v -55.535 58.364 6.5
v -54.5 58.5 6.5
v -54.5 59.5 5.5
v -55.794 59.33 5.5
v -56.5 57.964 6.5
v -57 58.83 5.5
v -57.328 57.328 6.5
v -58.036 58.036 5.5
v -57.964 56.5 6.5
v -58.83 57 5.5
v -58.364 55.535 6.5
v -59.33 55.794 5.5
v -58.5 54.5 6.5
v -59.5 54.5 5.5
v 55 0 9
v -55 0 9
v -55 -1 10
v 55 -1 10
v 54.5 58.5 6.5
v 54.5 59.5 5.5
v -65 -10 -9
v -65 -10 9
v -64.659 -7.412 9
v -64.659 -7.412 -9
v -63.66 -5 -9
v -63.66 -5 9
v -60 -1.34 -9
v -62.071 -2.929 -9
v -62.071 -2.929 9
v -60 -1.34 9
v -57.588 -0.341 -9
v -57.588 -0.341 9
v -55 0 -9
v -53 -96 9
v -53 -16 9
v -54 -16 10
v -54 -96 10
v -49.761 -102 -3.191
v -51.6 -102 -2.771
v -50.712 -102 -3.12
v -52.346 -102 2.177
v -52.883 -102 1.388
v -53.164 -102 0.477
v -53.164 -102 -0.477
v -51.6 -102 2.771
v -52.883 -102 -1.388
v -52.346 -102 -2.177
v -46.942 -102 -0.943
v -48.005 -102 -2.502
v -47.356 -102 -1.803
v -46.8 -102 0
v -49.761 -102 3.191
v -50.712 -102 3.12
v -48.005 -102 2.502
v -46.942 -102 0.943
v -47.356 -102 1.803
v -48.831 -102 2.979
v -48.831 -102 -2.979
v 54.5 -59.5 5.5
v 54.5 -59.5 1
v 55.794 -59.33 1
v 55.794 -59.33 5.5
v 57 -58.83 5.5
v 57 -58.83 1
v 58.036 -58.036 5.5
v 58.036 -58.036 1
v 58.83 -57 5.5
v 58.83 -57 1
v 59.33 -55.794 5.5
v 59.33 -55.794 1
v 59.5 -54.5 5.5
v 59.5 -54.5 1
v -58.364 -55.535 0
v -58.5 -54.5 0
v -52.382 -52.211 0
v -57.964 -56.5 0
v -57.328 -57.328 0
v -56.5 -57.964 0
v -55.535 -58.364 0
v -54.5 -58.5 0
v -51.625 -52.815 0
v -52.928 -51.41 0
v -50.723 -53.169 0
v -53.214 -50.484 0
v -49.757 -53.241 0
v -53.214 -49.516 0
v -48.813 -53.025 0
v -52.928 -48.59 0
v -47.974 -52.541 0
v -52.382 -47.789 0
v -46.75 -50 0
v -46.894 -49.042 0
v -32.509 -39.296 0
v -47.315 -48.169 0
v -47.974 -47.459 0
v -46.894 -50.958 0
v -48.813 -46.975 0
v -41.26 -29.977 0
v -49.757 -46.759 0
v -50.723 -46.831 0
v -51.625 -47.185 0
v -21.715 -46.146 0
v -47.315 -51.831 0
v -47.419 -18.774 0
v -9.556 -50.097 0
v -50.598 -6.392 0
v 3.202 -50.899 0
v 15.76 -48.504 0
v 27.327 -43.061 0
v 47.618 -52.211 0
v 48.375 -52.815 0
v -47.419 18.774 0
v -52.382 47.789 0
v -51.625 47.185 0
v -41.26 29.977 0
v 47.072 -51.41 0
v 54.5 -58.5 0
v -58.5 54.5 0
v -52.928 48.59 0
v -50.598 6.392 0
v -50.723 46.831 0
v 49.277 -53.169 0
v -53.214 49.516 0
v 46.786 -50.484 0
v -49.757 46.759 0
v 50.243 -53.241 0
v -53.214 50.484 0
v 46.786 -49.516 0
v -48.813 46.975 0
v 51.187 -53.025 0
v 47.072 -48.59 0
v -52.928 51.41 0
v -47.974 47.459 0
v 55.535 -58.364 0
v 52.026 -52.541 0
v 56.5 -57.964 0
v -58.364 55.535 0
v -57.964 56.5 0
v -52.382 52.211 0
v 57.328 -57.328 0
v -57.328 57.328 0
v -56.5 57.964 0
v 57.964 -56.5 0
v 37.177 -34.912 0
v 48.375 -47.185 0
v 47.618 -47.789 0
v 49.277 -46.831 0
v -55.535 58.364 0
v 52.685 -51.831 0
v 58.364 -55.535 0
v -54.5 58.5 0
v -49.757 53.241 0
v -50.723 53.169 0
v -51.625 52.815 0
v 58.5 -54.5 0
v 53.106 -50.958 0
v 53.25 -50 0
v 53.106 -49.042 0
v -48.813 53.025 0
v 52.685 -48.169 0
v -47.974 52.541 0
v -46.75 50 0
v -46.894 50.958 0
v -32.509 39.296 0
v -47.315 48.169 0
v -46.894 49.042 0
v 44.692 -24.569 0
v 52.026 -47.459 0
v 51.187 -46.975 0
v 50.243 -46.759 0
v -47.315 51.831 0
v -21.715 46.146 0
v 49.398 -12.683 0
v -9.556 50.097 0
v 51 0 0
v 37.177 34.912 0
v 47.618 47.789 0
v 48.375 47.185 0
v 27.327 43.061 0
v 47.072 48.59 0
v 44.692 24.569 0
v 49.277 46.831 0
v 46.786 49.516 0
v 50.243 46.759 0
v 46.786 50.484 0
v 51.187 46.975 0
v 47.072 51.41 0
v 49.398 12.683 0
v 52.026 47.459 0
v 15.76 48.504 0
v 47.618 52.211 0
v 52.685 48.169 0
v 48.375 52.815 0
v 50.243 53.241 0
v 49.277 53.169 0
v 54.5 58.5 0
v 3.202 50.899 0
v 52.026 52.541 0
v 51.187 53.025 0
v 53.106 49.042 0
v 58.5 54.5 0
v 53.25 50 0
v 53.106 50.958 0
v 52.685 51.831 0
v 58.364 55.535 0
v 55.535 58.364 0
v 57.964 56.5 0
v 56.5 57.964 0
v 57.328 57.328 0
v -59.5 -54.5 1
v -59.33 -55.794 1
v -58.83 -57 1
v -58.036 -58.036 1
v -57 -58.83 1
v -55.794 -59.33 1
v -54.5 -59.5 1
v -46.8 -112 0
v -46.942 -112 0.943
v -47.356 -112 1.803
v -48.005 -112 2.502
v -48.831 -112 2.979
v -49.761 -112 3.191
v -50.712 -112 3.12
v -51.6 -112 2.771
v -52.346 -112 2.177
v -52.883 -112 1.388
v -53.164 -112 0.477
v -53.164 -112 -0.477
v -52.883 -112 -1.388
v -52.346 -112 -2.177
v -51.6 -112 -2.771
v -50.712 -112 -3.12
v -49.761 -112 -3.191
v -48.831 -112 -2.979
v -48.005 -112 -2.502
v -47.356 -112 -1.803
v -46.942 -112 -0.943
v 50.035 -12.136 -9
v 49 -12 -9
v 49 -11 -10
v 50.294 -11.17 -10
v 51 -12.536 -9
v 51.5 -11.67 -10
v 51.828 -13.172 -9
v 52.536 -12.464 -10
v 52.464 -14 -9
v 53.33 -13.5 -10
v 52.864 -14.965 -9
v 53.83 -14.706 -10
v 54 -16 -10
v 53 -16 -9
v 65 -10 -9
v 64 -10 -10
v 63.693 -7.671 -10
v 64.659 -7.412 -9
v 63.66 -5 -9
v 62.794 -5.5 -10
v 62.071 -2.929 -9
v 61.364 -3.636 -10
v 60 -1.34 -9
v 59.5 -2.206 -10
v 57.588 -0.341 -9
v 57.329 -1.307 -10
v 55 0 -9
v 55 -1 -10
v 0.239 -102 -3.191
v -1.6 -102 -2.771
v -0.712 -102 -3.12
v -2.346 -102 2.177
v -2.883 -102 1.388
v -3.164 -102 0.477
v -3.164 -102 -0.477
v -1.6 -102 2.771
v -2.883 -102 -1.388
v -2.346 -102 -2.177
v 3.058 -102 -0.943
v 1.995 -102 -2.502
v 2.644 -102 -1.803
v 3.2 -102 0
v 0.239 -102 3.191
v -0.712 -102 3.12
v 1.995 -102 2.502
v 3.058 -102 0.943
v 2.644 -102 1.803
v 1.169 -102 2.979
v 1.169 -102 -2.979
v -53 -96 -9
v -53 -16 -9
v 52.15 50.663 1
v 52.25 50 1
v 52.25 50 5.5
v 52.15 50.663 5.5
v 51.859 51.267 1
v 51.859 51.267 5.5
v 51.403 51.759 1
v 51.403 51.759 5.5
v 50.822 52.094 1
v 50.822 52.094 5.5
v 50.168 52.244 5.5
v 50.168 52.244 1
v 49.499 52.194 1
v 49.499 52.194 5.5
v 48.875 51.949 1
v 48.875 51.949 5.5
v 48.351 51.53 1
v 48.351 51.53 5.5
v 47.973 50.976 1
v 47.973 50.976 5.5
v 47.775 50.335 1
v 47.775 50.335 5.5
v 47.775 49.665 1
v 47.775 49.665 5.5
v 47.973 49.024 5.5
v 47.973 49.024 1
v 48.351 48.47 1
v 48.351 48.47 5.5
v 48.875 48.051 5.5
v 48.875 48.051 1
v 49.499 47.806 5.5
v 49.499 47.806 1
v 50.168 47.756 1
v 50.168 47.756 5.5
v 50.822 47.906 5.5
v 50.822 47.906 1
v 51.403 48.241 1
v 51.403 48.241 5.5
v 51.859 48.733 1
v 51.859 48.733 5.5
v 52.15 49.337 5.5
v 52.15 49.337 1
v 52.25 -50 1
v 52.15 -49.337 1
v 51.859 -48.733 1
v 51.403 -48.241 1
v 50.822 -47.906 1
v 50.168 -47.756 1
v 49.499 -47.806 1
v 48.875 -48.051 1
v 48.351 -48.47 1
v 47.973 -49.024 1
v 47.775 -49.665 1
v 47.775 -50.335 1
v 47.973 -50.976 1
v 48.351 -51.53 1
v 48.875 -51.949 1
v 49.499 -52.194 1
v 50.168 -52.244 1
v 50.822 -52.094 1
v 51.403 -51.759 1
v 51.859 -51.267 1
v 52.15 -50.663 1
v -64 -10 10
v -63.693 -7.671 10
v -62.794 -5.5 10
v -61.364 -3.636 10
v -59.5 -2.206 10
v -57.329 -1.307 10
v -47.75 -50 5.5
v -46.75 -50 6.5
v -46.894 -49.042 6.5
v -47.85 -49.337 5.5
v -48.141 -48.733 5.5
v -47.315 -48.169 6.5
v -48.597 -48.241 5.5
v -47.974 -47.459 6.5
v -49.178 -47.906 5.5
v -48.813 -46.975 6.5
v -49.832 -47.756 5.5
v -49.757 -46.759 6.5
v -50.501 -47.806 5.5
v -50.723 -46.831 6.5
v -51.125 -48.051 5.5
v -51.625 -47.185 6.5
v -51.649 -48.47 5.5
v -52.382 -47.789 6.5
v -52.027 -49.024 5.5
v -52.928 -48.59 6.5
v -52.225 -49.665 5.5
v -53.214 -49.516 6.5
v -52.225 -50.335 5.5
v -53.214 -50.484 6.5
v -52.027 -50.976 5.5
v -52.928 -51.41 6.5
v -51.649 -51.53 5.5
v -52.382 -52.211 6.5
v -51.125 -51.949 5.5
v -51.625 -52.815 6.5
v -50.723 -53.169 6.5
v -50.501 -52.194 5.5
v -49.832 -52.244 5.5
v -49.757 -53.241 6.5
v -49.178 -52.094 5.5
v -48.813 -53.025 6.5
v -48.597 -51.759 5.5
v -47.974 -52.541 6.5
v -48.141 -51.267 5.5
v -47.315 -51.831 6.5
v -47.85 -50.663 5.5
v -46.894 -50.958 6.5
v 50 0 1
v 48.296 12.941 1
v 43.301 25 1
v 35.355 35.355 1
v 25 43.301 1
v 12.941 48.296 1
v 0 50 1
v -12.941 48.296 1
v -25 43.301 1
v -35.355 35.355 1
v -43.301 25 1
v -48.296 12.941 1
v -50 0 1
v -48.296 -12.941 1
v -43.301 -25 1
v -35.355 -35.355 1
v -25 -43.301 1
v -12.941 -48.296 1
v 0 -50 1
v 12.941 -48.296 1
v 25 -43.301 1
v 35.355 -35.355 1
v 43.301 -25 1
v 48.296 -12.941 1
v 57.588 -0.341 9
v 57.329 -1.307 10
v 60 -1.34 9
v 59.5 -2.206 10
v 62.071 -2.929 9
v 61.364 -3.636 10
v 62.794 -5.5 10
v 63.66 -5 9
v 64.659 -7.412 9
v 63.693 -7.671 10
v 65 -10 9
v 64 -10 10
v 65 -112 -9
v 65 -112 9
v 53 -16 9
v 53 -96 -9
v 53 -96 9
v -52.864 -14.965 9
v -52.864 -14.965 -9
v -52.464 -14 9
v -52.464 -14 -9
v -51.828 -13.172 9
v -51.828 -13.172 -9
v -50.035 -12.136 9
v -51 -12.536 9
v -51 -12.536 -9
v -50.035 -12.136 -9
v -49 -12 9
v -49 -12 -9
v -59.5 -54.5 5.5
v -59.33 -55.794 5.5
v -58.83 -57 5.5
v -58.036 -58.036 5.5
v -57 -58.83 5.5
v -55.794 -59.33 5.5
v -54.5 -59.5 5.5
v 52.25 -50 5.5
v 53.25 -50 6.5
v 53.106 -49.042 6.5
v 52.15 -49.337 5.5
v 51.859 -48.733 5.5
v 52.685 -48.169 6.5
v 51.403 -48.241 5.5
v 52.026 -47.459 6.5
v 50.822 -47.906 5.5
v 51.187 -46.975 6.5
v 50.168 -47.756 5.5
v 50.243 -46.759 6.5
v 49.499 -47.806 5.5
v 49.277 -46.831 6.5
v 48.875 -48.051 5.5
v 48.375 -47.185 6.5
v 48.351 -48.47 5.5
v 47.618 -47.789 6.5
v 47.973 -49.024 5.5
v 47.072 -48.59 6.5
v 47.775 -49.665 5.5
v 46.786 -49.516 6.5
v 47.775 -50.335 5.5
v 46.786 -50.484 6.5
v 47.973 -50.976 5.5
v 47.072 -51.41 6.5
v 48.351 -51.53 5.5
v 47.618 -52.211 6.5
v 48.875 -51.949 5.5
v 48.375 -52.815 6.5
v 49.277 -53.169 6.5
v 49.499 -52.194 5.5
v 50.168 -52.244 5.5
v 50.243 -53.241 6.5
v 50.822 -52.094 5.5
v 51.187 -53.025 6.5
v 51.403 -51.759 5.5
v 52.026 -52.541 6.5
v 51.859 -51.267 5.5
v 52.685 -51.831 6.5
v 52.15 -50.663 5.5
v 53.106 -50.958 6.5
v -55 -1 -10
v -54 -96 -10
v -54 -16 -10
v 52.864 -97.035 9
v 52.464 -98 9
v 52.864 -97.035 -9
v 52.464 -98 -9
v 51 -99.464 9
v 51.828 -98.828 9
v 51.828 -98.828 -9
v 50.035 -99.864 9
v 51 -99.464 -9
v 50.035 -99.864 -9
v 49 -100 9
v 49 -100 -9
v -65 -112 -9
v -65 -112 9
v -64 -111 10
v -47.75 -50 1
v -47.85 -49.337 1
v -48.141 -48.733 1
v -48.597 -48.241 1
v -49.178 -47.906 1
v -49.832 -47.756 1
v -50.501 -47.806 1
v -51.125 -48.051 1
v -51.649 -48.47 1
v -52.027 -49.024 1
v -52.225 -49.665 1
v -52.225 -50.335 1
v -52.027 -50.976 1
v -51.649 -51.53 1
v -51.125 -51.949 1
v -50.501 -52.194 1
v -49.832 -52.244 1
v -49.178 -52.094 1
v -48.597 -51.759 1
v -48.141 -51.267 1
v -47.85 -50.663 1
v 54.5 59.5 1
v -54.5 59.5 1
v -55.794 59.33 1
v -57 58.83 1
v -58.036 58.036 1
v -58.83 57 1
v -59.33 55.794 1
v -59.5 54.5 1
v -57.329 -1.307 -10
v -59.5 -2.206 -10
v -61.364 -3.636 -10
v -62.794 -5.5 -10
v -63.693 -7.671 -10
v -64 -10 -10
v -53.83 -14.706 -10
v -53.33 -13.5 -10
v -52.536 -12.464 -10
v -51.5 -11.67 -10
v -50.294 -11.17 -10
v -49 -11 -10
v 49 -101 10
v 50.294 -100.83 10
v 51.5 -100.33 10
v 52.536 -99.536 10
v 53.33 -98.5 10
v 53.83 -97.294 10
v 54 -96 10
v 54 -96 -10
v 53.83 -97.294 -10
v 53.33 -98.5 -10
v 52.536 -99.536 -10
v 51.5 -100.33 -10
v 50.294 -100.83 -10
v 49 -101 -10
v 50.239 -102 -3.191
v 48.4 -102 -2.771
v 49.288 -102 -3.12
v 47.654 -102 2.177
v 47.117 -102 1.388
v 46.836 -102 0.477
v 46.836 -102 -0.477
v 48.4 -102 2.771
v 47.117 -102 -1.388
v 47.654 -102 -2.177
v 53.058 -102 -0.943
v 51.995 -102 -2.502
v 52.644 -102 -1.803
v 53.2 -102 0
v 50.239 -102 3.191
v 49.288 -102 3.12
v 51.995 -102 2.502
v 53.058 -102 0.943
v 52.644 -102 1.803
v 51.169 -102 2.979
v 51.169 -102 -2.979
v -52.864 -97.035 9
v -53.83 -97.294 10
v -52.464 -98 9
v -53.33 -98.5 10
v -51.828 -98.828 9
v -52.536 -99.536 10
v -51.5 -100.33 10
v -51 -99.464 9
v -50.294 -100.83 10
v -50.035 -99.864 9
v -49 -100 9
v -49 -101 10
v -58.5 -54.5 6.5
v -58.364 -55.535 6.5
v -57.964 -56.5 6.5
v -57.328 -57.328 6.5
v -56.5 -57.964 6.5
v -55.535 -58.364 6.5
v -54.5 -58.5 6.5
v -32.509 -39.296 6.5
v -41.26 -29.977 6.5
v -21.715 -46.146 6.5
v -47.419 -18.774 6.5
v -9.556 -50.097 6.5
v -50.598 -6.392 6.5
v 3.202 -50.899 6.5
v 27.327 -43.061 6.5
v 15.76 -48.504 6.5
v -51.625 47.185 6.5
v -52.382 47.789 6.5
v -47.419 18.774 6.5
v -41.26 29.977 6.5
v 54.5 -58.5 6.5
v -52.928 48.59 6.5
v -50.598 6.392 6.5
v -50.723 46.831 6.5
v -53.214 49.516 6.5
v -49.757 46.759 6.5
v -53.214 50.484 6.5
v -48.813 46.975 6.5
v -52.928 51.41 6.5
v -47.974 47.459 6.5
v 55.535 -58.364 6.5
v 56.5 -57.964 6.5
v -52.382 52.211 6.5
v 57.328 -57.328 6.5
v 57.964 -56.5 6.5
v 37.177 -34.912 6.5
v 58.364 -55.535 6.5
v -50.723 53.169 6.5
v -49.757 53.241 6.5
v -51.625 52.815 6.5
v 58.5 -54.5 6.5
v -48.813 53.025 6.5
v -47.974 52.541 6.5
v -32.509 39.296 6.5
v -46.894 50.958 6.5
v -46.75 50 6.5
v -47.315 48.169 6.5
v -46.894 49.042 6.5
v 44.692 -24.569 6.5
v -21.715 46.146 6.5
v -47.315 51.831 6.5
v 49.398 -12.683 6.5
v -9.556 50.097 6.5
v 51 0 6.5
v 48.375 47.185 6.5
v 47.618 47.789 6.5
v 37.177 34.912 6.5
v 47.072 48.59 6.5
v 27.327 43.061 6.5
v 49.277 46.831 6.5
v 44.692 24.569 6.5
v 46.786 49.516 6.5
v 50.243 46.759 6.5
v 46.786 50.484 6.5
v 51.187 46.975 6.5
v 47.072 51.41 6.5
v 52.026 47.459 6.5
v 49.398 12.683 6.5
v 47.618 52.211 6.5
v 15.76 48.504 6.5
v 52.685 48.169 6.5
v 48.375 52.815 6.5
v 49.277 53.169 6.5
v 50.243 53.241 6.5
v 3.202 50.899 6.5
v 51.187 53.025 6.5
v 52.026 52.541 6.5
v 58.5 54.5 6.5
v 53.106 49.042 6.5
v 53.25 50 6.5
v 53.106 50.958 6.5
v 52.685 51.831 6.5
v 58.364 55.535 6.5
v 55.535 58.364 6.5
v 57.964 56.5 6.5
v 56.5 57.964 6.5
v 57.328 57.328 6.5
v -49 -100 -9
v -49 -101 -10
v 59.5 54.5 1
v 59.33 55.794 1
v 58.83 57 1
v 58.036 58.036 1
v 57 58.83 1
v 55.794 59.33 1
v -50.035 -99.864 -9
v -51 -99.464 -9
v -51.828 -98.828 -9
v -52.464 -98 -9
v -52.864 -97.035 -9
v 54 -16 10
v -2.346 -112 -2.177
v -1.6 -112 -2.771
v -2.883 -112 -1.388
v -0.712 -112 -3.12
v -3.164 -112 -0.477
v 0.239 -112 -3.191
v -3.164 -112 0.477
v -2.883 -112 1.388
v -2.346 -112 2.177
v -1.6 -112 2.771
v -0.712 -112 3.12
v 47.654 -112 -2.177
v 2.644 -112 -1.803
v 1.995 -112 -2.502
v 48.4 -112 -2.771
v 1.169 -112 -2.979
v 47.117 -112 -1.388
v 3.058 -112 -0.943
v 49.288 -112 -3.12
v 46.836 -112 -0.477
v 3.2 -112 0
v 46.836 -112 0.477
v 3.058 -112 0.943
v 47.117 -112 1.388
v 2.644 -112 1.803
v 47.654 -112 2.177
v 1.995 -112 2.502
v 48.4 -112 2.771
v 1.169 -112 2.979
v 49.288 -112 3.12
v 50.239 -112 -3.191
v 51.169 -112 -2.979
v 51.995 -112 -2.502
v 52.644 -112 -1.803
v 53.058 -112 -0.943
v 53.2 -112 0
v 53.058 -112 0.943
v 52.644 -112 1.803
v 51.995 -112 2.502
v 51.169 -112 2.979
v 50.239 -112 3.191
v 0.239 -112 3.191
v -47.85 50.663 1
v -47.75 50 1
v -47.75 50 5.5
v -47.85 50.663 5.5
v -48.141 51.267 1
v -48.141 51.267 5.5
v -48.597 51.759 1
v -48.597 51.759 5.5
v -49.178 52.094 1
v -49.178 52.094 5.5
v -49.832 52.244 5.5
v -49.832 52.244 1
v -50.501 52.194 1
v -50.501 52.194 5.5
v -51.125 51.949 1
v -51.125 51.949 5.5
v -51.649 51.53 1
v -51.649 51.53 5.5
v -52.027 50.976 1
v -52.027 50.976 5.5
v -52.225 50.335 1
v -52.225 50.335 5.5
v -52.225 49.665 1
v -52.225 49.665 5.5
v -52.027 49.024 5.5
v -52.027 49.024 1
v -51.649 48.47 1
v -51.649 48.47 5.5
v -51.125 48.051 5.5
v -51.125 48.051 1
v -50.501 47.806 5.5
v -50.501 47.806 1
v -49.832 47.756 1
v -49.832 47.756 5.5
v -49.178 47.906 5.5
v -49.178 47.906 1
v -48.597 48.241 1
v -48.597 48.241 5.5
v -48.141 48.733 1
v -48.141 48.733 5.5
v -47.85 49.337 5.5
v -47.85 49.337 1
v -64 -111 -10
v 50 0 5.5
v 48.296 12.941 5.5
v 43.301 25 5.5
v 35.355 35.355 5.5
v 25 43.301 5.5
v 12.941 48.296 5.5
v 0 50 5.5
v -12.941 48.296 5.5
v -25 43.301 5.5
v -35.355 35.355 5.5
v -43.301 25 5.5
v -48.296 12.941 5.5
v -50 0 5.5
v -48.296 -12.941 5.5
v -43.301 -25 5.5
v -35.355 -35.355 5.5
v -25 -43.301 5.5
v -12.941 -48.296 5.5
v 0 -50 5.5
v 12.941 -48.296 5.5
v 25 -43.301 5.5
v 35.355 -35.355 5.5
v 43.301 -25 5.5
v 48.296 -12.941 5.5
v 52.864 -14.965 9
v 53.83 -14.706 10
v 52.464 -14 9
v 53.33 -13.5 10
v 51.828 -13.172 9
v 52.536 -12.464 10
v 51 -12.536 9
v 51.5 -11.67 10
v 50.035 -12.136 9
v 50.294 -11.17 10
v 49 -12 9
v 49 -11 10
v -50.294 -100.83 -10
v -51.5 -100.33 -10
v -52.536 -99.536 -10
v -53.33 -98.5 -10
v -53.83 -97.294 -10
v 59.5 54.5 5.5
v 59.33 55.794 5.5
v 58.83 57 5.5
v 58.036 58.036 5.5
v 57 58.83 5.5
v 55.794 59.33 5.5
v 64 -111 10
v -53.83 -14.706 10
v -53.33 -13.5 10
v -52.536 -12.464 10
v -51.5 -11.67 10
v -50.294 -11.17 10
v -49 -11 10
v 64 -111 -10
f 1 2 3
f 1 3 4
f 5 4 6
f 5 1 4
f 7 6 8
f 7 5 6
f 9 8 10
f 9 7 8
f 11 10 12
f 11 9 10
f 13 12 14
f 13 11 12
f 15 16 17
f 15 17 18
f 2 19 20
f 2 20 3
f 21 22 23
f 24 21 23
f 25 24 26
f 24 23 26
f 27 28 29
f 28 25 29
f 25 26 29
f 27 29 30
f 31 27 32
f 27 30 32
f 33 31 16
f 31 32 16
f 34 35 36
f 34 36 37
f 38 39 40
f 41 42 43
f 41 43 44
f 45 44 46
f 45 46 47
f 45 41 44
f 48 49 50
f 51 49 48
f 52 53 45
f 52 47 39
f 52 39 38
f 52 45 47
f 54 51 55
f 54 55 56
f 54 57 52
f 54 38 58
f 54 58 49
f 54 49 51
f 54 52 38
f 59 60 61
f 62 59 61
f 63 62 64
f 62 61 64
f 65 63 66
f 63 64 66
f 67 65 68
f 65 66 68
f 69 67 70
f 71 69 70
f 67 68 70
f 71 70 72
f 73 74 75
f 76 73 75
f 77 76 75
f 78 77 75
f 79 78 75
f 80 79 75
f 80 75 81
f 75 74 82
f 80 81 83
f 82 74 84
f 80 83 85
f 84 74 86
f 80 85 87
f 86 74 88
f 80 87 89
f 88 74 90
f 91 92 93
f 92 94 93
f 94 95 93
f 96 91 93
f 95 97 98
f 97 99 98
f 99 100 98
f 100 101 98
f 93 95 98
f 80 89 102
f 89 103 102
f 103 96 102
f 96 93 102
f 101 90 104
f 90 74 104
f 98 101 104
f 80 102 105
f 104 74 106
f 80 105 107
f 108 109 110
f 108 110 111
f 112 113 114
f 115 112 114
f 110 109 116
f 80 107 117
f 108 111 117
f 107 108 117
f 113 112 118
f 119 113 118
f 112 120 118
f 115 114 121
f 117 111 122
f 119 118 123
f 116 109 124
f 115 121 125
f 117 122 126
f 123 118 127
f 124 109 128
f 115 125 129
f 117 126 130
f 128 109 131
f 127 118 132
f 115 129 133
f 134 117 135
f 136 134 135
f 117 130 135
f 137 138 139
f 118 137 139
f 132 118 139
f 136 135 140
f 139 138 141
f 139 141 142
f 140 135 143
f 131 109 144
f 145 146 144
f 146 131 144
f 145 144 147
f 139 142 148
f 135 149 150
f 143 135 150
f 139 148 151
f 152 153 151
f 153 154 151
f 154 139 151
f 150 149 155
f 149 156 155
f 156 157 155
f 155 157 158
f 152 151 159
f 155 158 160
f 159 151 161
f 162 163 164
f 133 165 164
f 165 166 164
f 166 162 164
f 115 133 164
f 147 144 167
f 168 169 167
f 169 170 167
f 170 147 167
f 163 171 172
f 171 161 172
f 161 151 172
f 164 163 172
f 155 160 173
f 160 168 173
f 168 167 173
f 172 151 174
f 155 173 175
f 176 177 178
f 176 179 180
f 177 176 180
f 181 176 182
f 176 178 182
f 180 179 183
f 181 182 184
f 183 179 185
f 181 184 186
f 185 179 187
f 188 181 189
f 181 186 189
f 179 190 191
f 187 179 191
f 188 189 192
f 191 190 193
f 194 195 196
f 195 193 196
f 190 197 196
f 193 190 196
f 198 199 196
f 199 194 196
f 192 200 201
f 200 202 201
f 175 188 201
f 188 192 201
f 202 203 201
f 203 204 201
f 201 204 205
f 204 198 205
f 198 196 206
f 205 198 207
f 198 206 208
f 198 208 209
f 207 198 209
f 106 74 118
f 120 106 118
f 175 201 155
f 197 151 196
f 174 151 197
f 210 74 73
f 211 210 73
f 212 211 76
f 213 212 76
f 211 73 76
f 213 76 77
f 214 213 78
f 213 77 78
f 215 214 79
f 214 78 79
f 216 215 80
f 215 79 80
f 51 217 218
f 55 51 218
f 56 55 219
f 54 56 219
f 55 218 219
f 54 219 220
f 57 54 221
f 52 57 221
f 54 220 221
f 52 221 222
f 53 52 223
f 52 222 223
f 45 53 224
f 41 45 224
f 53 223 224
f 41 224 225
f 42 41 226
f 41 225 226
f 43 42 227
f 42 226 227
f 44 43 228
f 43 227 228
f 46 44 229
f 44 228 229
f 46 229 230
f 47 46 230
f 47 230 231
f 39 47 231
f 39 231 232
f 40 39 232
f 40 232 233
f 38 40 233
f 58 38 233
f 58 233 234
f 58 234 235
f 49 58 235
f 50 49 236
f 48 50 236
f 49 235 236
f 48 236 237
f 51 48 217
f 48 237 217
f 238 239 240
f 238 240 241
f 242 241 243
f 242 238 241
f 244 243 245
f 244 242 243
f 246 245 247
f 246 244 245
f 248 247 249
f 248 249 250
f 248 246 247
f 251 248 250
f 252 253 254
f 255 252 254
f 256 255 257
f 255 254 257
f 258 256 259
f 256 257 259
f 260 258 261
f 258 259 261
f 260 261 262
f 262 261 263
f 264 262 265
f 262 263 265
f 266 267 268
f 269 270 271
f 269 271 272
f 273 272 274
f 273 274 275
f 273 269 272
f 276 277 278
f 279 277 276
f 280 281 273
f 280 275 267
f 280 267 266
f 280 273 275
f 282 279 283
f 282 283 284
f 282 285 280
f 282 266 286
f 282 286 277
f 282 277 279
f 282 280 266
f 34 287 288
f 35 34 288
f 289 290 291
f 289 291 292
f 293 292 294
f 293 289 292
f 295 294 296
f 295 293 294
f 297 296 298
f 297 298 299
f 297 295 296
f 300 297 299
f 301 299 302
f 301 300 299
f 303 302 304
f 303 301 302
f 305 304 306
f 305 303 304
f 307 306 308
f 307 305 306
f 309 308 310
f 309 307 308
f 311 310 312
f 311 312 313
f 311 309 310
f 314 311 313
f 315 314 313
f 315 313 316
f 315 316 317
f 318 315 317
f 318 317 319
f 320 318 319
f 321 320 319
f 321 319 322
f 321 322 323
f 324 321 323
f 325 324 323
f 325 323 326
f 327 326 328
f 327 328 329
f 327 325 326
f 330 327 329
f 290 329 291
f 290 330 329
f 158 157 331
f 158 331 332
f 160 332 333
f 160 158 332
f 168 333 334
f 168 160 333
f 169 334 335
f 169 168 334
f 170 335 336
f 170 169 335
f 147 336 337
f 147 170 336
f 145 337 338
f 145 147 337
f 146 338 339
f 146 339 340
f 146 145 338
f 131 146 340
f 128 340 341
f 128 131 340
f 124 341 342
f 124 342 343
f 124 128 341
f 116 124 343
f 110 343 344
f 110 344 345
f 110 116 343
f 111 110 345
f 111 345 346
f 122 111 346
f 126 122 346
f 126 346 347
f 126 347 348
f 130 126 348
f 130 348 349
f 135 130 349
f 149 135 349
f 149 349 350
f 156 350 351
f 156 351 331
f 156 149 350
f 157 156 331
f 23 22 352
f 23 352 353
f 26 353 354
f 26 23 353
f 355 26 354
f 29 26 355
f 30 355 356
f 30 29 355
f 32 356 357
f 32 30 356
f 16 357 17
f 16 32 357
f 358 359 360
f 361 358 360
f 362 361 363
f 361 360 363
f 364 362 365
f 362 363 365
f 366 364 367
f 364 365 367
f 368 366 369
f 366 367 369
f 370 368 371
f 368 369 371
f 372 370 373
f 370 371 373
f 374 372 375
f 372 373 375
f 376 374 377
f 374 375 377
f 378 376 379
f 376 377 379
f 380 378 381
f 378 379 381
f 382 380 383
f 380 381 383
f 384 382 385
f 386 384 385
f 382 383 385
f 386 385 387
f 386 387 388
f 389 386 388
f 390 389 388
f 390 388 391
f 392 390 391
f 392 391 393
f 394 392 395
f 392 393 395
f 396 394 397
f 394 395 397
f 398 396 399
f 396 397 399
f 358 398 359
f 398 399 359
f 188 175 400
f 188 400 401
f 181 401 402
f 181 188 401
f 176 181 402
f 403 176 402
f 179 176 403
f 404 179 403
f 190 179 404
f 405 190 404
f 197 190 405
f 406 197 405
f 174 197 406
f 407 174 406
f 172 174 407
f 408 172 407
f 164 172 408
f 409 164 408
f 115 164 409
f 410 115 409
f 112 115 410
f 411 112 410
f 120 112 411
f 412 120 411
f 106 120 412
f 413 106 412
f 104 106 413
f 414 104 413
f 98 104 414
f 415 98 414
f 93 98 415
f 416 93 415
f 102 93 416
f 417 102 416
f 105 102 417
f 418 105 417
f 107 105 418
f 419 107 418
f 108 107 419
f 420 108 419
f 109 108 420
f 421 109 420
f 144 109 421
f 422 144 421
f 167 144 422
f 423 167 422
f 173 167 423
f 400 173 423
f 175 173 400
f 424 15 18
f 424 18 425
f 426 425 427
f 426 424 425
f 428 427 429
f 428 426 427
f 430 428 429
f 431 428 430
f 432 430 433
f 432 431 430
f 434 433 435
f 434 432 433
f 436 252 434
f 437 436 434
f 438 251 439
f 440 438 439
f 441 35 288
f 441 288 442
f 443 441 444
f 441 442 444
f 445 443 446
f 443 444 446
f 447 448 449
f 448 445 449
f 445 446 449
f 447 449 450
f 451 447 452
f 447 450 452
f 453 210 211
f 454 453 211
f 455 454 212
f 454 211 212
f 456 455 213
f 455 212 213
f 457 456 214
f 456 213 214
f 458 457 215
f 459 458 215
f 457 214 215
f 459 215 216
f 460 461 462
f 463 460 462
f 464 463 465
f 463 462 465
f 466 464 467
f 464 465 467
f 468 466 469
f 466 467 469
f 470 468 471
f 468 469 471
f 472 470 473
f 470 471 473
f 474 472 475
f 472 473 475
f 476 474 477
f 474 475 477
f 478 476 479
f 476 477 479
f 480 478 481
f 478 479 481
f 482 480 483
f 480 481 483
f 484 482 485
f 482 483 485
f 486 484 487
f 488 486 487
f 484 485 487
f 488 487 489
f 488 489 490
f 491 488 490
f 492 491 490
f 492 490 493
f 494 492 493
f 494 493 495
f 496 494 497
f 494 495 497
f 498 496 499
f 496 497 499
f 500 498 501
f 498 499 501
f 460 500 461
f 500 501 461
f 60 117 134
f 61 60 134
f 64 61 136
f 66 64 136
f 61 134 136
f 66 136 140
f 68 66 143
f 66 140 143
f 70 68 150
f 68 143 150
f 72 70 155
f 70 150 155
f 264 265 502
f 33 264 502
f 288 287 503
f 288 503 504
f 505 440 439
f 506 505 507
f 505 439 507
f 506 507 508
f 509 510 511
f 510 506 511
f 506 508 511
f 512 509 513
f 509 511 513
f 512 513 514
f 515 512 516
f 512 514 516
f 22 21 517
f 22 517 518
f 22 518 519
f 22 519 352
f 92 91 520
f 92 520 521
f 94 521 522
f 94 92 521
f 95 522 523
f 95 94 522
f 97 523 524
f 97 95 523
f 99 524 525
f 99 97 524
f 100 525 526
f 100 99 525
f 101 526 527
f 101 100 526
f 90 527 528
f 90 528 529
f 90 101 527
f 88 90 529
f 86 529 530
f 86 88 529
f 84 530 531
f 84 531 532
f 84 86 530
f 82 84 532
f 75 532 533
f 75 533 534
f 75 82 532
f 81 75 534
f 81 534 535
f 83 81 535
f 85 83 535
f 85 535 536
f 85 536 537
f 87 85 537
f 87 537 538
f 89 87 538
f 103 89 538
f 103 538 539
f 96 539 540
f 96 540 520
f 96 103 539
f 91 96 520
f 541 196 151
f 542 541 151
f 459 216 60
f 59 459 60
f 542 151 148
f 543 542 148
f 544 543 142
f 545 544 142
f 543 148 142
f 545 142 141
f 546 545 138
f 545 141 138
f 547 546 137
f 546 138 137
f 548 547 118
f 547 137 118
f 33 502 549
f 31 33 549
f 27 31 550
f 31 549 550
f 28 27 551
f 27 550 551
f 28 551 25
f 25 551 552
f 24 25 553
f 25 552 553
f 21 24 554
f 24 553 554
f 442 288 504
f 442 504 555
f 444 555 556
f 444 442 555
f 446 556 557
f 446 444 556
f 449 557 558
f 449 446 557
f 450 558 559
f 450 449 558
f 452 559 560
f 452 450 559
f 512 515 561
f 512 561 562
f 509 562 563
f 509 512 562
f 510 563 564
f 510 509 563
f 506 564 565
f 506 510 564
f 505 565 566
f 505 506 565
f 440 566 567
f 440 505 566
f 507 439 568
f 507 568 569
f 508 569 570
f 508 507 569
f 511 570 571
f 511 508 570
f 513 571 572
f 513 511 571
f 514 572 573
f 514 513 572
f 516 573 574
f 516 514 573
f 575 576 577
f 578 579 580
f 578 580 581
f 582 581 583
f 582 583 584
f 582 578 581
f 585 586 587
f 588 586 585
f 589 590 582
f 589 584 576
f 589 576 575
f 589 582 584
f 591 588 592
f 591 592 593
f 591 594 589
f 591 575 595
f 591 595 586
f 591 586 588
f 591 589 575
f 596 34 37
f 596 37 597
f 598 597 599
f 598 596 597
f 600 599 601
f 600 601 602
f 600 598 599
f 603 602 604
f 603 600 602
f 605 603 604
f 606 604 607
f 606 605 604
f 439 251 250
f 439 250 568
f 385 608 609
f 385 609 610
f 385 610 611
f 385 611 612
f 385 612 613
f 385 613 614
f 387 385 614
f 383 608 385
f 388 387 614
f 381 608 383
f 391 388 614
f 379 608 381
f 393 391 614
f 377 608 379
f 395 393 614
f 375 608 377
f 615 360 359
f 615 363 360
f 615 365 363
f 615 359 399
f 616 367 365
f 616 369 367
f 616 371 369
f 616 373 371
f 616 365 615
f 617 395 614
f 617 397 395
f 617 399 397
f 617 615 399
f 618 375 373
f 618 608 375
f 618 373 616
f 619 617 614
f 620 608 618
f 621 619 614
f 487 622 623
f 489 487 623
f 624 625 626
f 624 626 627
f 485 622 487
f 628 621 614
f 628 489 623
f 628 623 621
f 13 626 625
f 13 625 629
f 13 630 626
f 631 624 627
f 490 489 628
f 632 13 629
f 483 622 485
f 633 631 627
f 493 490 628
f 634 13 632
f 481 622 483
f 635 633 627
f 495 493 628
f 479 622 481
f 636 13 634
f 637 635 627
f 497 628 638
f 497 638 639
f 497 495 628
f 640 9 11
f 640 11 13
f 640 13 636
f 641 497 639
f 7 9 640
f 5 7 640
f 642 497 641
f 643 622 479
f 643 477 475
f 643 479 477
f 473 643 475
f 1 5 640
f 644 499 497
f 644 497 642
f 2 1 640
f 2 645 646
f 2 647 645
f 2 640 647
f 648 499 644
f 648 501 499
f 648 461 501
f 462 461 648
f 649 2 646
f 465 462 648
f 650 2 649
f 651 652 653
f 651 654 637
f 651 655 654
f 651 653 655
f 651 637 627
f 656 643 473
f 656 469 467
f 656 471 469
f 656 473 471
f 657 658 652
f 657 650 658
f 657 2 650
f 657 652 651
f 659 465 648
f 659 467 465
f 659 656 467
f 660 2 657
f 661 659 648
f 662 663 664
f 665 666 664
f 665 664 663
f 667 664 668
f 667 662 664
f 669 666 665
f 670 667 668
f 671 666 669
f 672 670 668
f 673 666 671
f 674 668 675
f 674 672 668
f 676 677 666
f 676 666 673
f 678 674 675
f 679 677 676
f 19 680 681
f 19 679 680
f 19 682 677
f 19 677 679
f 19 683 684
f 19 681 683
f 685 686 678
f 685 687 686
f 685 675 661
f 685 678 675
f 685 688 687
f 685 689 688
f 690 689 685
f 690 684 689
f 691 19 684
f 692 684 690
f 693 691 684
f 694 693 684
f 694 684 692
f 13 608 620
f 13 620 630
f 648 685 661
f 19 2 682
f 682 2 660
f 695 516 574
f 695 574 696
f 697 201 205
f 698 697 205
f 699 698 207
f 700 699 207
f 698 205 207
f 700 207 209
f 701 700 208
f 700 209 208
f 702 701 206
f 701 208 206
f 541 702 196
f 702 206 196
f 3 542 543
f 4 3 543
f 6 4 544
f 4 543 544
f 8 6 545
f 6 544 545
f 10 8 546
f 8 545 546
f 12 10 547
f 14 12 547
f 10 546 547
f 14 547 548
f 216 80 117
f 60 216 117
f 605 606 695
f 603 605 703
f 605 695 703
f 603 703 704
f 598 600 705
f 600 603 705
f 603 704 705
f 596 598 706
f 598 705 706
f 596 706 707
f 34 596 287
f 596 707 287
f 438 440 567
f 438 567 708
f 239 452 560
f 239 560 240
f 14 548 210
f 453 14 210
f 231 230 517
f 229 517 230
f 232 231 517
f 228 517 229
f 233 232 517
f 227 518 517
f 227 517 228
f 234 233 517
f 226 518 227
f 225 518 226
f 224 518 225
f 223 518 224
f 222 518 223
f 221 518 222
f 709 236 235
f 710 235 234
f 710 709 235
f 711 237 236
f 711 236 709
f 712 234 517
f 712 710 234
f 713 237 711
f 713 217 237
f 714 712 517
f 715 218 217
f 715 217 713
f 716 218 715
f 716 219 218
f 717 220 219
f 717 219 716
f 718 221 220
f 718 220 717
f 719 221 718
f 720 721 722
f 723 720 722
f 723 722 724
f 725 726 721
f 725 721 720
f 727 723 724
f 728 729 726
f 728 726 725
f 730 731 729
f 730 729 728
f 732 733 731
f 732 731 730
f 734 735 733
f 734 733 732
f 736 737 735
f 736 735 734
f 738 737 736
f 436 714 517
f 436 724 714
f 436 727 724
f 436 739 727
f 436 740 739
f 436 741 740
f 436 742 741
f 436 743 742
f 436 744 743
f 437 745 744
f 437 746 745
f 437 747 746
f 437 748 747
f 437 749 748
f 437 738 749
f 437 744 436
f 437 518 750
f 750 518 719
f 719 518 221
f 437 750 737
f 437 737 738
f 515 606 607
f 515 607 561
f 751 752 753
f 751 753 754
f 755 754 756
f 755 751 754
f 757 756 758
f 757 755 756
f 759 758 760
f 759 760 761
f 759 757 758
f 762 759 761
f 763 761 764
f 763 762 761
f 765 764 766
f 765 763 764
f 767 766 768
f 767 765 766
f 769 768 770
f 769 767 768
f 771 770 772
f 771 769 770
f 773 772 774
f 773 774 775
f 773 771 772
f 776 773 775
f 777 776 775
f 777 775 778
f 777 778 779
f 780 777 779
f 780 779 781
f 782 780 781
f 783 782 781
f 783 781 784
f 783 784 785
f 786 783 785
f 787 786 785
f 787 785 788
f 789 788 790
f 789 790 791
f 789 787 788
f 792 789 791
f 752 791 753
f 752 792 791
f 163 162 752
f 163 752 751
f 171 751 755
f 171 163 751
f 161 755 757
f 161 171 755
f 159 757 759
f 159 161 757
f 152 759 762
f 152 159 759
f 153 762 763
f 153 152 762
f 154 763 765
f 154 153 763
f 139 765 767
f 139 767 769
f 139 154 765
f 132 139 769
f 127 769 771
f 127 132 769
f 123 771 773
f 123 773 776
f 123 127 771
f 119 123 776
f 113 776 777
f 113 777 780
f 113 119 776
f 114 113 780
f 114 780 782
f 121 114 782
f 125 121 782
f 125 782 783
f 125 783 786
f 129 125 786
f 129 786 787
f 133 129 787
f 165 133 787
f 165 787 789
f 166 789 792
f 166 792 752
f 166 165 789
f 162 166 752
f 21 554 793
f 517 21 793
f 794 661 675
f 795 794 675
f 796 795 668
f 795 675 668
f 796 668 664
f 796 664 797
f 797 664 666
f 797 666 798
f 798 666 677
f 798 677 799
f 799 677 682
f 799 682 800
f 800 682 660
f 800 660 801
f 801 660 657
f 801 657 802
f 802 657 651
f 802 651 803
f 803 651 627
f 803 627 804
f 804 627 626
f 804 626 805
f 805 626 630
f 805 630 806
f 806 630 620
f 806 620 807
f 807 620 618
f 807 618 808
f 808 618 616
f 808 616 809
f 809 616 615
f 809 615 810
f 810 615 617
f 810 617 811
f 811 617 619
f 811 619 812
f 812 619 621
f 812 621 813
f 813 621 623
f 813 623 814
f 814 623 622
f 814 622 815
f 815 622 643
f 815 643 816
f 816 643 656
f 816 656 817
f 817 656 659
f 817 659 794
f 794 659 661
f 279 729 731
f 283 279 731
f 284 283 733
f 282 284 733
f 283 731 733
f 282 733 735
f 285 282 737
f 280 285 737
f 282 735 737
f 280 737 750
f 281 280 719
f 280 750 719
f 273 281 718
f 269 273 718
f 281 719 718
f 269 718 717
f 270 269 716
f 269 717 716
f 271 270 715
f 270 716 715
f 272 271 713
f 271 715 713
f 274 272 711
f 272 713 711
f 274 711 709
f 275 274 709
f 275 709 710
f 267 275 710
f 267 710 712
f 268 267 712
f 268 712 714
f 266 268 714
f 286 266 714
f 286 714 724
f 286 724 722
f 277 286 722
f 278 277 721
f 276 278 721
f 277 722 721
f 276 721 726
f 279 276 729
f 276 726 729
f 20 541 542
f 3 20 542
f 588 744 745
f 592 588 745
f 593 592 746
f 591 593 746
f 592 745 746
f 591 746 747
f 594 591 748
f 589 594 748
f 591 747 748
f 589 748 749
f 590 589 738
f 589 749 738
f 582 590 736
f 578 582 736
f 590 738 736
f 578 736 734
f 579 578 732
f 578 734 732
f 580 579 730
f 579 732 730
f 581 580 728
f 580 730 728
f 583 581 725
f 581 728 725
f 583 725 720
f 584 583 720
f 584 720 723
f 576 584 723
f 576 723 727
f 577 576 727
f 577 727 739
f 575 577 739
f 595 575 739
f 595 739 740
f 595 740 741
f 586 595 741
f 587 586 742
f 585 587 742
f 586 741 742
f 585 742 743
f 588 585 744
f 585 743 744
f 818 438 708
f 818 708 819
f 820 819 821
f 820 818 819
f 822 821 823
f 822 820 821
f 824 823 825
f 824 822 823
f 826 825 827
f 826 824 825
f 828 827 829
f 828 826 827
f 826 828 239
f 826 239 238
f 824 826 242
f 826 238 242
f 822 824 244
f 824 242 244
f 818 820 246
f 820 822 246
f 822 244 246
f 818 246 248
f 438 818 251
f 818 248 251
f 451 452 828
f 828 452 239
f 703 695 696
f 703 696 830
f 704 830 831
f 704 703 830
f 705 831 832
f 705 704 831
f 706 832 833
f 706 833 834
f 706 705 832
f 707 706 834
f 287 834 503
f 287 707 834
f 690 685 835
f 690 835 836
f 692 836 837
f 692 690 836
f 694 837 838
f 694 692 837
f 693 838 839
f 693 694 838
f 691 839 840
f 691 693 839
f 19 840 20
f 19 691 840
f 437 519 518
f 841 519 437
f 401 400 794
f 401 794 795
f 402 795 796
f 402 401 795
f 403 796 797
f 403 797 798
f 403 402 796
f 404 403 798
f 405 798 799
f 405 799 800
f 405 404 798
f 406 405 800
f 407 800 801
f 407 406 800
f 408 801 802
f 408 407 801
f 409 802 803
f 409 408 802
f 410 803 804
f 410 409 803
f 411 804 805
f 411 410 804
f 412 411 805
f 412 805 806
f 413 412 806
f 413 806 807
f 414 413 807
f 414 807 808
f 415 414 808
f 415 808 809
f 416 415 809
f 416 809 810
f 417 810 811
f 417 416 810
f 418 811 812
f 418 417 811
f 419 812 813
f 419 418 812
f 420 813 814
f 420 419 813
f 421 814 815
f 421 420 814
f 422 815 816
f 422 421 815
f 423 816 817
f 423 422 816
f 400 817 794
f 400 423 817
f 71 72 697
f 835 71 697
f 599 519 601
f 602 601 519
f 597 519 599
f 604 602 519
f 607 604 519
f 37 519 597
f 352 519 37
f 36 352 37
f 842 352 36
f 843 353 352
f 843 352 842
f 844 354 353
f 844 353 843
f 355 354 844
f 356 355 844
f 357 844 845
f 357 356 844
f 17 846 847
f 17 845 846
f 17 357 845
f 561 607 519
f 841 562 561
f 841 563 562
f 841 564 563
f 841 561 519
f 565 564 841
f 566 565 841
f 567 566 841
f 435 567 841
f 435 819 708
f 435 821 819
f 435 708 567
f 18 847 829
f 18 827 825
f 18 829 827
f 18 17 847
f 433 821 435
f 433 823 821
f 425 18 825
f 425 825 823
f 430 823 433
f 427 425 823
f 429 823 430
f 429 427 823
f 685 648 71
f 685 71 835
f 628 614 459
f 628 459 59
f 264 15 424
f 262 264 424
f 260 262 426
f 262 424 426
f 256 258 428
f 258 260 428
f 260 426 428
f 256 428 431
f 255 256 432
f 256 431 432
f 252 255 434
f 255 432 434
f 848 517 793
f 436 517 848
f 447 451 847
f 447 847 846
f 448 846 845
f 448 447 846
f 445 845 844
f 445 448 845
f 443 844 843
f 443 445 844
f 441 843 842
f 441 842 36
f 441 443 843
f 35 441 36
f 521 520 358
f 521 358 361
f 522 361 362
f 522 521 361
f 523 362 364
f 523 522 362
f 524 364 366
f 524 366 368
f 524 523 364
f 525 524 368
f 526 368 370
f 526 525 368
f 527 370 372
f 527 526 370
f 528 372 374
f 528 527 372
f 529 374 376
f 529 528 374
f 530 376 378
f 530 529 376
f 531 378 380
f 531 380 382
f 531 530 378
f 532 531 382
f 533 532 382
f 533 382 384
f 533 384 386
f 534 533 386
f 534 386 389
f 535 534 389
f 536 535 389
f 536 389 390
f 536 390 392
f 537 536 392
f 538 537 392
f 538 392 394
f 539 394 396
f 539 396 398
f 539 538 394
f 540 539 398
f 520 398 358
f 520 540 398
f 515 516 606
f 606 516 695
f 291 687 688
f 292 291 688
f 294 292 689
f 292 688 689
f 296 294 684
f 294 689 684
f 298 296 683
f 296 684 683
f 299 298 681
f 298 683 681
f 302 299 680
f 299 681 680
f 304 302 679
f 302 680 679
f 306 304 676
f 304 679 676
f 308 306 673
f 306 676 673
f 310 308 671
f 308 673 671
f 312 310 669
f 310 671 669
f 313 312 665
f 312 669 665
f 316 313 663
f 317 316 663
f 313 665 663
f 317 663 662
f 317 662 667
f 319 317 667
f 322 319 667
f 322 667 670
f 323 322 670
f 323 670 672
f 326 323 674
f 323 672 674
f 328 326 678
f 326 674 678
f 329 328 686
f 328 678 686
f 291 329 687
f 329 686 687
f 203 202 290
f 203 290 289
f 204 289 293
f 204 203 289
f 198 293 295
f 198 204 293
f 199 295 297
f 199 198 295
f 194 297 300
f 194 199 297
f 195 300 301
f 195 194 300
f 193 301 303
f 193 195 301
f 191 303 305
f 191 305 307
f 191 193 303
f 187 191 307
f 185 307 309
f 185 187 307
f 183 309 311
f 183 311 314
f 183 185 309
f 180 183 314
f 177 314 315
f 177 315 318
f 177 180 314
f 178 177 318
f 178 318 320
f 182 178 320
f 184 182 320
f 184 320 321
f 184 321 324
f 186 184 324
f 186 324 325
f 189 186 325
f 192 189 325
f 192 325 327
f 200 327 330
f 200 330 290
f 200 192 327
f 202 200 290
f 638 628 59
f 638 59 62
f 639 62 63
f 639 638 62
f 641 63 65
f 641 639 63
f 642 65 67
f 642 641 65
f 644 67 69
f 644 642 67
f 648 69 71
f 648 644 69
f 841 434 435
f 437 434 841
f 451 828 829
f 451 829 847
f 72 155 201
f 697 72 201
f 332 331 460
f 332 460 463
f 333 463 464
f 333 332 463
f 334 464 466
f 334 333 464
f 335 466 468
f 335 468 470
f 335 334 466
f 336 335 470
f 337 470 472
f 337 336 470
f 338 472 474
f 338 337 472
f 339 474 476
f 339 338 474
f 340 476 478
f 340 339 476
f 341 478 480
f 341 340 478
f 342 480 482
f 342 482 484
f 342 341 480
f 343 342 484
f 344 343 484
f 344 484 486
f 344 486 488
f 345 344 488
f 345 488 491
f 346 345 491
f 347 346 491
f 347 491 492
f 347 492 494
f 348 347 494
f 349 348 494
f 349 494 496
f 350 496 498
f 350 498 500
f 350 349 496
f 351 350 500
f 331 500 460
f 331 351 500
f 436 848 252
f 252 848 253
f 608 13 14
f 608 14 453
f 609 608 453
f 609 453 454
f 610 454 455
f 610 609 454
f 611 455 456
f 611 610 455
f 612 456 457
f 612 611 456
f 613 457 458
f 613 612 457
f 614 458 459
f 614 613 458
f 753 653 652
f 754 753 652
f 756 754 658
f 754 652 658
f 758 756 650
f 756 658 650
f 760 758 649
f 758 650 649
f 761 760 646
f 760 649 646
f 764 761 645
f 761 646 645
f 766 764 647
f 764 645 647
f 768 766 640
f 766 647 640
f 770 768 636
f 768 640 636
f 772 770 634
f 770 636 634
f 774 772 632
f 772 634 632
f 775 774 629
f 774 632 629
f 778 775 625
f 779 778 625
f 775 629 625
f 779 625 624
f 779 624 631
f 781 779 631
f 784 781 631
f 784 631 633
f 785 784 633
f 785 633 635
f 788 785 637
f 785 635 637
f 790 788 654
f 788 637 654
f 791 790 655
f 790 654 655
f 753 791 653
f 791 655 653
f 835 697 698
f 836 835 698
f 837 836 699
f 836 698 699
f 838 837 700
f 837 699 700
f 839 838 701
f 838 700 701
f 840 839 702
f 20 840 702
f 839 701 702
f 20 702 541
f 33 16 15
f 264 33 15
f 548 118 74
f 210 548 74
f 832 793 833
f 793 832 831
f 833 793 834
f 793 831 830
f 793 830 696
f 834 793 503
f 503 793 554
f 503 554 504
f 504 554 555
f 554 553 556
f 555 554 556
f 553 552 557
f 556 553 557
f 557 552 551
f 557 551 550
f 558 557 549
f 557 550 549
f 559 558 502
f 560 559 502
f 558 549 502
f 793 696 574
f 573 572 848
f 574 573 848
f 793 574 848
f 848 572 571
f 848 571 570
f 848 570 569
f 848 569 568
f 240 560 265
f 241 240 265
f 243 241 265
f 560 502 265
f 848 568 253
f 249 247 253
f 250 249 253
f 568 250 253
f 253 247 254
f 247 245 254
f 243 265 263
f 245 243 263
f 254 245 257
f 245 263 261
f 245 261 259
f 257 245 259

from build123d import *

# Parameters (mm, degrees)
SKETCH_R        = 2.25
SKETCH_R_2      = 50
PAD_DEPTH       = 6.5
CHAMFER_SIZE    = 1
SKETCH005_W     = 130
SKETCH005_H     = 20
PAD001_DEPTH    = 112
SKETCH006_R     = 3.2
POCKET_DEPTH    = 10
POCKET001_DEPTH = 20.001
FILLET_R        = 10
CHAMFER001_SIZE = 1


with BuildPart() as spacer:
    # Sketch → Pad (new body)
    with BuildSketch(Plane.XY):
        with BuildLine():
            Line((-59.5, 54.5), (-59.5, -54.5))
            ThreePointArc((-59.5, -54.5), (-58.035534, -58.035534), (-54.5, -59.5))
            Line((-54.5, -59.5), (54.5, -59.5))
            ThreePointArc((54.5, -59.5), (58.035534, -58.035534), (59.5, -54.5))
            Line((59.5, -54.5), (59.5, 54.5))
            ThreePointArc((59.5, 54.5), (58.035534, 58.035534), (54.5, 59.5))
            Line((54.5, 59.5), (-54.5, 59.5))
            ThreePointArc((-54.5, 59.5), (-58.035534, 58.035534), (-59.5, 54.5))
        make_face()
        with Locations((-50, 50)):
            Circle(SKETCH_R, mode=Mode.SUBTRACT)
        with Locations((50, 50)):
            Circle(SKETCH_R, mode=Mode.SUBTRACT)
        with Locations((50, -50)):
            Circle(SKETCH_R, mode=Mode.SUBTRACT)
        with Locations((-50, -50)):
            Circle(SKETCH_R, mode=Mode.SUBTRACT)
        Circle(SKETCH_R_2, mode=Mode.SUBTRACT)
    extrude(amount=PAD_DEPTH)

    # Chamfer
    chamfer_edges = [spacer.edges().sort_by_distance(p)[0] for p in [
        (-59.5, 0, 6.5),
        (-58.035534, -58.035534, 6.5),
        (0, -59.5, 6.5),
        (58.035534, -58.035534, 6.5),
        (59.5, 0, 6.5),
        (58.035534, 58.035534, 6.5),
        (0, 59.5, 6.5),
        (-58.035534, 58.035534, 6.5),
        (-50, 0, 6.5),
        (-52.25, -50, 6.5),
        (47.75, -50, 6.5),
        (47.75, 50, 6.5),
        (-52.25, 50, 6.5),
        (-59.5, 0, 0),
        (-58.035534, -58.035534, 0),
        (0, -59.5, 0),
        (58.035534, -58.035534, 0),
        (59.5, 0, 0),
        (58.035534, 58.035534, 0),
        (0, 59.5, 0),
        (-58.035534, 58.035534, 0),
        (-50, 0, 0),
        (-52.25, -50, 0),
        (47.75, -50, 0),
        (47.75, 50, 0),
        (-52.25, 50, 0),
    ]]
    chamfer(chamfer_edges, length=CHAMFER_SIZE)


with BuildPart() as riser:
    # Sketch005 → Pad001 (new body)
    with BuildSketch(Plane.XZ):
        Rectangle(SKETCH005_W, SKETCH005_H)
    extrude(amount=PAD001_DEPTH)

    # Sketch006 (on Face6 of Pad001) → Pocket (cut)
    with BuildSketch(Plane.XZ.offset(112)):
        Circle(SKETCH006_R)
        with Locations((50, 0)):
            Circle(SKETCH006_R)
        with Locations((-50, 0)):
            Circle(SKETCH006_R)
    extrude(amount=-POCKET_DEPTH, mode=Mode.SUBTRACT)

    # Sketch007 (on Face3 of Pocket) → Pocket001 (cut, through all)
    with BuildSketch(Plane(origin=(0, 0, -10), x_dir=(1, 0, 0), z_dir=(0, 0, -1))):
        with BuildLine():
            Line((-53, 96), (-53, 16))
            ThreePointArc((-53, 16), (-51.828427, 13.171573), (-49, 12))
            Line((-49, 12), (49, 12))
            ThreePointArc((49, 12), (51.828427, 13.171573), (53, 16))
            Line((53, 16), (53, 96))
            ThreePointArc((53, 96), (51.828427, 98.828427), (49, 100))
            Line((49, 100), (-49, 100))
            ThreePointArc((-49, 100), (-51.828427, 98.828427), (-53, 96))
        make_face()
    extrude(amount=-POCKET001_DEPTH, mode=Mode.SUBTRACT)

    # Fillet
    fillet_edges = [riser.edges().sort_by_distance(p)[0] for p in [
        (-65, 0, 0),
        (65, 0, 0),
    ]]
    fillet(fillet_edges, radius=FILLET_R)

    # Chamfer001
    chamfer001_edges = [riser.edges().sort_by_distance(p)[0] for p in [
        (-65, -61, -10),
        (-62.071068, -2.928932, -10),
        (0, -112, -10),
        (0, 0, -10),
        (65, -61, -10),
        (62.071068, -2.928932, -10),
        (-51.828427, -98.828427, -10),
        (0, -100, -10),
        (51.828427, -98.828427, -10),
        (53, -56, -10),
        (51.828427, -13.171573, -10),
        (0, -12, -10),
        (-51.828427, -13.171573, -10),
        (-53, -56, -10),
        (65, -61, 10),
        (62.071068, -2.928932, 10),
        (0, -112, 10),
        (0, 0, 10),
        (-65, -61, 10),
        (-62.071068, -2.928932, 10),
        (-53, -56, 10),
        (-51.828427, -13.171573, 10),
        (0, -12, 10),
        (51.828427, -13.171573, 10),
        (53, -56, 10),
        (51.828427, -98.828427, 10),
        (0, -100, 10),
        (-51.828427, -98.828427, 10),
    ]]
    chamfer(chamfer001_edges, length=CHAMFER001_SIZE)


solid = Compound([spacer.part, riser.part])
